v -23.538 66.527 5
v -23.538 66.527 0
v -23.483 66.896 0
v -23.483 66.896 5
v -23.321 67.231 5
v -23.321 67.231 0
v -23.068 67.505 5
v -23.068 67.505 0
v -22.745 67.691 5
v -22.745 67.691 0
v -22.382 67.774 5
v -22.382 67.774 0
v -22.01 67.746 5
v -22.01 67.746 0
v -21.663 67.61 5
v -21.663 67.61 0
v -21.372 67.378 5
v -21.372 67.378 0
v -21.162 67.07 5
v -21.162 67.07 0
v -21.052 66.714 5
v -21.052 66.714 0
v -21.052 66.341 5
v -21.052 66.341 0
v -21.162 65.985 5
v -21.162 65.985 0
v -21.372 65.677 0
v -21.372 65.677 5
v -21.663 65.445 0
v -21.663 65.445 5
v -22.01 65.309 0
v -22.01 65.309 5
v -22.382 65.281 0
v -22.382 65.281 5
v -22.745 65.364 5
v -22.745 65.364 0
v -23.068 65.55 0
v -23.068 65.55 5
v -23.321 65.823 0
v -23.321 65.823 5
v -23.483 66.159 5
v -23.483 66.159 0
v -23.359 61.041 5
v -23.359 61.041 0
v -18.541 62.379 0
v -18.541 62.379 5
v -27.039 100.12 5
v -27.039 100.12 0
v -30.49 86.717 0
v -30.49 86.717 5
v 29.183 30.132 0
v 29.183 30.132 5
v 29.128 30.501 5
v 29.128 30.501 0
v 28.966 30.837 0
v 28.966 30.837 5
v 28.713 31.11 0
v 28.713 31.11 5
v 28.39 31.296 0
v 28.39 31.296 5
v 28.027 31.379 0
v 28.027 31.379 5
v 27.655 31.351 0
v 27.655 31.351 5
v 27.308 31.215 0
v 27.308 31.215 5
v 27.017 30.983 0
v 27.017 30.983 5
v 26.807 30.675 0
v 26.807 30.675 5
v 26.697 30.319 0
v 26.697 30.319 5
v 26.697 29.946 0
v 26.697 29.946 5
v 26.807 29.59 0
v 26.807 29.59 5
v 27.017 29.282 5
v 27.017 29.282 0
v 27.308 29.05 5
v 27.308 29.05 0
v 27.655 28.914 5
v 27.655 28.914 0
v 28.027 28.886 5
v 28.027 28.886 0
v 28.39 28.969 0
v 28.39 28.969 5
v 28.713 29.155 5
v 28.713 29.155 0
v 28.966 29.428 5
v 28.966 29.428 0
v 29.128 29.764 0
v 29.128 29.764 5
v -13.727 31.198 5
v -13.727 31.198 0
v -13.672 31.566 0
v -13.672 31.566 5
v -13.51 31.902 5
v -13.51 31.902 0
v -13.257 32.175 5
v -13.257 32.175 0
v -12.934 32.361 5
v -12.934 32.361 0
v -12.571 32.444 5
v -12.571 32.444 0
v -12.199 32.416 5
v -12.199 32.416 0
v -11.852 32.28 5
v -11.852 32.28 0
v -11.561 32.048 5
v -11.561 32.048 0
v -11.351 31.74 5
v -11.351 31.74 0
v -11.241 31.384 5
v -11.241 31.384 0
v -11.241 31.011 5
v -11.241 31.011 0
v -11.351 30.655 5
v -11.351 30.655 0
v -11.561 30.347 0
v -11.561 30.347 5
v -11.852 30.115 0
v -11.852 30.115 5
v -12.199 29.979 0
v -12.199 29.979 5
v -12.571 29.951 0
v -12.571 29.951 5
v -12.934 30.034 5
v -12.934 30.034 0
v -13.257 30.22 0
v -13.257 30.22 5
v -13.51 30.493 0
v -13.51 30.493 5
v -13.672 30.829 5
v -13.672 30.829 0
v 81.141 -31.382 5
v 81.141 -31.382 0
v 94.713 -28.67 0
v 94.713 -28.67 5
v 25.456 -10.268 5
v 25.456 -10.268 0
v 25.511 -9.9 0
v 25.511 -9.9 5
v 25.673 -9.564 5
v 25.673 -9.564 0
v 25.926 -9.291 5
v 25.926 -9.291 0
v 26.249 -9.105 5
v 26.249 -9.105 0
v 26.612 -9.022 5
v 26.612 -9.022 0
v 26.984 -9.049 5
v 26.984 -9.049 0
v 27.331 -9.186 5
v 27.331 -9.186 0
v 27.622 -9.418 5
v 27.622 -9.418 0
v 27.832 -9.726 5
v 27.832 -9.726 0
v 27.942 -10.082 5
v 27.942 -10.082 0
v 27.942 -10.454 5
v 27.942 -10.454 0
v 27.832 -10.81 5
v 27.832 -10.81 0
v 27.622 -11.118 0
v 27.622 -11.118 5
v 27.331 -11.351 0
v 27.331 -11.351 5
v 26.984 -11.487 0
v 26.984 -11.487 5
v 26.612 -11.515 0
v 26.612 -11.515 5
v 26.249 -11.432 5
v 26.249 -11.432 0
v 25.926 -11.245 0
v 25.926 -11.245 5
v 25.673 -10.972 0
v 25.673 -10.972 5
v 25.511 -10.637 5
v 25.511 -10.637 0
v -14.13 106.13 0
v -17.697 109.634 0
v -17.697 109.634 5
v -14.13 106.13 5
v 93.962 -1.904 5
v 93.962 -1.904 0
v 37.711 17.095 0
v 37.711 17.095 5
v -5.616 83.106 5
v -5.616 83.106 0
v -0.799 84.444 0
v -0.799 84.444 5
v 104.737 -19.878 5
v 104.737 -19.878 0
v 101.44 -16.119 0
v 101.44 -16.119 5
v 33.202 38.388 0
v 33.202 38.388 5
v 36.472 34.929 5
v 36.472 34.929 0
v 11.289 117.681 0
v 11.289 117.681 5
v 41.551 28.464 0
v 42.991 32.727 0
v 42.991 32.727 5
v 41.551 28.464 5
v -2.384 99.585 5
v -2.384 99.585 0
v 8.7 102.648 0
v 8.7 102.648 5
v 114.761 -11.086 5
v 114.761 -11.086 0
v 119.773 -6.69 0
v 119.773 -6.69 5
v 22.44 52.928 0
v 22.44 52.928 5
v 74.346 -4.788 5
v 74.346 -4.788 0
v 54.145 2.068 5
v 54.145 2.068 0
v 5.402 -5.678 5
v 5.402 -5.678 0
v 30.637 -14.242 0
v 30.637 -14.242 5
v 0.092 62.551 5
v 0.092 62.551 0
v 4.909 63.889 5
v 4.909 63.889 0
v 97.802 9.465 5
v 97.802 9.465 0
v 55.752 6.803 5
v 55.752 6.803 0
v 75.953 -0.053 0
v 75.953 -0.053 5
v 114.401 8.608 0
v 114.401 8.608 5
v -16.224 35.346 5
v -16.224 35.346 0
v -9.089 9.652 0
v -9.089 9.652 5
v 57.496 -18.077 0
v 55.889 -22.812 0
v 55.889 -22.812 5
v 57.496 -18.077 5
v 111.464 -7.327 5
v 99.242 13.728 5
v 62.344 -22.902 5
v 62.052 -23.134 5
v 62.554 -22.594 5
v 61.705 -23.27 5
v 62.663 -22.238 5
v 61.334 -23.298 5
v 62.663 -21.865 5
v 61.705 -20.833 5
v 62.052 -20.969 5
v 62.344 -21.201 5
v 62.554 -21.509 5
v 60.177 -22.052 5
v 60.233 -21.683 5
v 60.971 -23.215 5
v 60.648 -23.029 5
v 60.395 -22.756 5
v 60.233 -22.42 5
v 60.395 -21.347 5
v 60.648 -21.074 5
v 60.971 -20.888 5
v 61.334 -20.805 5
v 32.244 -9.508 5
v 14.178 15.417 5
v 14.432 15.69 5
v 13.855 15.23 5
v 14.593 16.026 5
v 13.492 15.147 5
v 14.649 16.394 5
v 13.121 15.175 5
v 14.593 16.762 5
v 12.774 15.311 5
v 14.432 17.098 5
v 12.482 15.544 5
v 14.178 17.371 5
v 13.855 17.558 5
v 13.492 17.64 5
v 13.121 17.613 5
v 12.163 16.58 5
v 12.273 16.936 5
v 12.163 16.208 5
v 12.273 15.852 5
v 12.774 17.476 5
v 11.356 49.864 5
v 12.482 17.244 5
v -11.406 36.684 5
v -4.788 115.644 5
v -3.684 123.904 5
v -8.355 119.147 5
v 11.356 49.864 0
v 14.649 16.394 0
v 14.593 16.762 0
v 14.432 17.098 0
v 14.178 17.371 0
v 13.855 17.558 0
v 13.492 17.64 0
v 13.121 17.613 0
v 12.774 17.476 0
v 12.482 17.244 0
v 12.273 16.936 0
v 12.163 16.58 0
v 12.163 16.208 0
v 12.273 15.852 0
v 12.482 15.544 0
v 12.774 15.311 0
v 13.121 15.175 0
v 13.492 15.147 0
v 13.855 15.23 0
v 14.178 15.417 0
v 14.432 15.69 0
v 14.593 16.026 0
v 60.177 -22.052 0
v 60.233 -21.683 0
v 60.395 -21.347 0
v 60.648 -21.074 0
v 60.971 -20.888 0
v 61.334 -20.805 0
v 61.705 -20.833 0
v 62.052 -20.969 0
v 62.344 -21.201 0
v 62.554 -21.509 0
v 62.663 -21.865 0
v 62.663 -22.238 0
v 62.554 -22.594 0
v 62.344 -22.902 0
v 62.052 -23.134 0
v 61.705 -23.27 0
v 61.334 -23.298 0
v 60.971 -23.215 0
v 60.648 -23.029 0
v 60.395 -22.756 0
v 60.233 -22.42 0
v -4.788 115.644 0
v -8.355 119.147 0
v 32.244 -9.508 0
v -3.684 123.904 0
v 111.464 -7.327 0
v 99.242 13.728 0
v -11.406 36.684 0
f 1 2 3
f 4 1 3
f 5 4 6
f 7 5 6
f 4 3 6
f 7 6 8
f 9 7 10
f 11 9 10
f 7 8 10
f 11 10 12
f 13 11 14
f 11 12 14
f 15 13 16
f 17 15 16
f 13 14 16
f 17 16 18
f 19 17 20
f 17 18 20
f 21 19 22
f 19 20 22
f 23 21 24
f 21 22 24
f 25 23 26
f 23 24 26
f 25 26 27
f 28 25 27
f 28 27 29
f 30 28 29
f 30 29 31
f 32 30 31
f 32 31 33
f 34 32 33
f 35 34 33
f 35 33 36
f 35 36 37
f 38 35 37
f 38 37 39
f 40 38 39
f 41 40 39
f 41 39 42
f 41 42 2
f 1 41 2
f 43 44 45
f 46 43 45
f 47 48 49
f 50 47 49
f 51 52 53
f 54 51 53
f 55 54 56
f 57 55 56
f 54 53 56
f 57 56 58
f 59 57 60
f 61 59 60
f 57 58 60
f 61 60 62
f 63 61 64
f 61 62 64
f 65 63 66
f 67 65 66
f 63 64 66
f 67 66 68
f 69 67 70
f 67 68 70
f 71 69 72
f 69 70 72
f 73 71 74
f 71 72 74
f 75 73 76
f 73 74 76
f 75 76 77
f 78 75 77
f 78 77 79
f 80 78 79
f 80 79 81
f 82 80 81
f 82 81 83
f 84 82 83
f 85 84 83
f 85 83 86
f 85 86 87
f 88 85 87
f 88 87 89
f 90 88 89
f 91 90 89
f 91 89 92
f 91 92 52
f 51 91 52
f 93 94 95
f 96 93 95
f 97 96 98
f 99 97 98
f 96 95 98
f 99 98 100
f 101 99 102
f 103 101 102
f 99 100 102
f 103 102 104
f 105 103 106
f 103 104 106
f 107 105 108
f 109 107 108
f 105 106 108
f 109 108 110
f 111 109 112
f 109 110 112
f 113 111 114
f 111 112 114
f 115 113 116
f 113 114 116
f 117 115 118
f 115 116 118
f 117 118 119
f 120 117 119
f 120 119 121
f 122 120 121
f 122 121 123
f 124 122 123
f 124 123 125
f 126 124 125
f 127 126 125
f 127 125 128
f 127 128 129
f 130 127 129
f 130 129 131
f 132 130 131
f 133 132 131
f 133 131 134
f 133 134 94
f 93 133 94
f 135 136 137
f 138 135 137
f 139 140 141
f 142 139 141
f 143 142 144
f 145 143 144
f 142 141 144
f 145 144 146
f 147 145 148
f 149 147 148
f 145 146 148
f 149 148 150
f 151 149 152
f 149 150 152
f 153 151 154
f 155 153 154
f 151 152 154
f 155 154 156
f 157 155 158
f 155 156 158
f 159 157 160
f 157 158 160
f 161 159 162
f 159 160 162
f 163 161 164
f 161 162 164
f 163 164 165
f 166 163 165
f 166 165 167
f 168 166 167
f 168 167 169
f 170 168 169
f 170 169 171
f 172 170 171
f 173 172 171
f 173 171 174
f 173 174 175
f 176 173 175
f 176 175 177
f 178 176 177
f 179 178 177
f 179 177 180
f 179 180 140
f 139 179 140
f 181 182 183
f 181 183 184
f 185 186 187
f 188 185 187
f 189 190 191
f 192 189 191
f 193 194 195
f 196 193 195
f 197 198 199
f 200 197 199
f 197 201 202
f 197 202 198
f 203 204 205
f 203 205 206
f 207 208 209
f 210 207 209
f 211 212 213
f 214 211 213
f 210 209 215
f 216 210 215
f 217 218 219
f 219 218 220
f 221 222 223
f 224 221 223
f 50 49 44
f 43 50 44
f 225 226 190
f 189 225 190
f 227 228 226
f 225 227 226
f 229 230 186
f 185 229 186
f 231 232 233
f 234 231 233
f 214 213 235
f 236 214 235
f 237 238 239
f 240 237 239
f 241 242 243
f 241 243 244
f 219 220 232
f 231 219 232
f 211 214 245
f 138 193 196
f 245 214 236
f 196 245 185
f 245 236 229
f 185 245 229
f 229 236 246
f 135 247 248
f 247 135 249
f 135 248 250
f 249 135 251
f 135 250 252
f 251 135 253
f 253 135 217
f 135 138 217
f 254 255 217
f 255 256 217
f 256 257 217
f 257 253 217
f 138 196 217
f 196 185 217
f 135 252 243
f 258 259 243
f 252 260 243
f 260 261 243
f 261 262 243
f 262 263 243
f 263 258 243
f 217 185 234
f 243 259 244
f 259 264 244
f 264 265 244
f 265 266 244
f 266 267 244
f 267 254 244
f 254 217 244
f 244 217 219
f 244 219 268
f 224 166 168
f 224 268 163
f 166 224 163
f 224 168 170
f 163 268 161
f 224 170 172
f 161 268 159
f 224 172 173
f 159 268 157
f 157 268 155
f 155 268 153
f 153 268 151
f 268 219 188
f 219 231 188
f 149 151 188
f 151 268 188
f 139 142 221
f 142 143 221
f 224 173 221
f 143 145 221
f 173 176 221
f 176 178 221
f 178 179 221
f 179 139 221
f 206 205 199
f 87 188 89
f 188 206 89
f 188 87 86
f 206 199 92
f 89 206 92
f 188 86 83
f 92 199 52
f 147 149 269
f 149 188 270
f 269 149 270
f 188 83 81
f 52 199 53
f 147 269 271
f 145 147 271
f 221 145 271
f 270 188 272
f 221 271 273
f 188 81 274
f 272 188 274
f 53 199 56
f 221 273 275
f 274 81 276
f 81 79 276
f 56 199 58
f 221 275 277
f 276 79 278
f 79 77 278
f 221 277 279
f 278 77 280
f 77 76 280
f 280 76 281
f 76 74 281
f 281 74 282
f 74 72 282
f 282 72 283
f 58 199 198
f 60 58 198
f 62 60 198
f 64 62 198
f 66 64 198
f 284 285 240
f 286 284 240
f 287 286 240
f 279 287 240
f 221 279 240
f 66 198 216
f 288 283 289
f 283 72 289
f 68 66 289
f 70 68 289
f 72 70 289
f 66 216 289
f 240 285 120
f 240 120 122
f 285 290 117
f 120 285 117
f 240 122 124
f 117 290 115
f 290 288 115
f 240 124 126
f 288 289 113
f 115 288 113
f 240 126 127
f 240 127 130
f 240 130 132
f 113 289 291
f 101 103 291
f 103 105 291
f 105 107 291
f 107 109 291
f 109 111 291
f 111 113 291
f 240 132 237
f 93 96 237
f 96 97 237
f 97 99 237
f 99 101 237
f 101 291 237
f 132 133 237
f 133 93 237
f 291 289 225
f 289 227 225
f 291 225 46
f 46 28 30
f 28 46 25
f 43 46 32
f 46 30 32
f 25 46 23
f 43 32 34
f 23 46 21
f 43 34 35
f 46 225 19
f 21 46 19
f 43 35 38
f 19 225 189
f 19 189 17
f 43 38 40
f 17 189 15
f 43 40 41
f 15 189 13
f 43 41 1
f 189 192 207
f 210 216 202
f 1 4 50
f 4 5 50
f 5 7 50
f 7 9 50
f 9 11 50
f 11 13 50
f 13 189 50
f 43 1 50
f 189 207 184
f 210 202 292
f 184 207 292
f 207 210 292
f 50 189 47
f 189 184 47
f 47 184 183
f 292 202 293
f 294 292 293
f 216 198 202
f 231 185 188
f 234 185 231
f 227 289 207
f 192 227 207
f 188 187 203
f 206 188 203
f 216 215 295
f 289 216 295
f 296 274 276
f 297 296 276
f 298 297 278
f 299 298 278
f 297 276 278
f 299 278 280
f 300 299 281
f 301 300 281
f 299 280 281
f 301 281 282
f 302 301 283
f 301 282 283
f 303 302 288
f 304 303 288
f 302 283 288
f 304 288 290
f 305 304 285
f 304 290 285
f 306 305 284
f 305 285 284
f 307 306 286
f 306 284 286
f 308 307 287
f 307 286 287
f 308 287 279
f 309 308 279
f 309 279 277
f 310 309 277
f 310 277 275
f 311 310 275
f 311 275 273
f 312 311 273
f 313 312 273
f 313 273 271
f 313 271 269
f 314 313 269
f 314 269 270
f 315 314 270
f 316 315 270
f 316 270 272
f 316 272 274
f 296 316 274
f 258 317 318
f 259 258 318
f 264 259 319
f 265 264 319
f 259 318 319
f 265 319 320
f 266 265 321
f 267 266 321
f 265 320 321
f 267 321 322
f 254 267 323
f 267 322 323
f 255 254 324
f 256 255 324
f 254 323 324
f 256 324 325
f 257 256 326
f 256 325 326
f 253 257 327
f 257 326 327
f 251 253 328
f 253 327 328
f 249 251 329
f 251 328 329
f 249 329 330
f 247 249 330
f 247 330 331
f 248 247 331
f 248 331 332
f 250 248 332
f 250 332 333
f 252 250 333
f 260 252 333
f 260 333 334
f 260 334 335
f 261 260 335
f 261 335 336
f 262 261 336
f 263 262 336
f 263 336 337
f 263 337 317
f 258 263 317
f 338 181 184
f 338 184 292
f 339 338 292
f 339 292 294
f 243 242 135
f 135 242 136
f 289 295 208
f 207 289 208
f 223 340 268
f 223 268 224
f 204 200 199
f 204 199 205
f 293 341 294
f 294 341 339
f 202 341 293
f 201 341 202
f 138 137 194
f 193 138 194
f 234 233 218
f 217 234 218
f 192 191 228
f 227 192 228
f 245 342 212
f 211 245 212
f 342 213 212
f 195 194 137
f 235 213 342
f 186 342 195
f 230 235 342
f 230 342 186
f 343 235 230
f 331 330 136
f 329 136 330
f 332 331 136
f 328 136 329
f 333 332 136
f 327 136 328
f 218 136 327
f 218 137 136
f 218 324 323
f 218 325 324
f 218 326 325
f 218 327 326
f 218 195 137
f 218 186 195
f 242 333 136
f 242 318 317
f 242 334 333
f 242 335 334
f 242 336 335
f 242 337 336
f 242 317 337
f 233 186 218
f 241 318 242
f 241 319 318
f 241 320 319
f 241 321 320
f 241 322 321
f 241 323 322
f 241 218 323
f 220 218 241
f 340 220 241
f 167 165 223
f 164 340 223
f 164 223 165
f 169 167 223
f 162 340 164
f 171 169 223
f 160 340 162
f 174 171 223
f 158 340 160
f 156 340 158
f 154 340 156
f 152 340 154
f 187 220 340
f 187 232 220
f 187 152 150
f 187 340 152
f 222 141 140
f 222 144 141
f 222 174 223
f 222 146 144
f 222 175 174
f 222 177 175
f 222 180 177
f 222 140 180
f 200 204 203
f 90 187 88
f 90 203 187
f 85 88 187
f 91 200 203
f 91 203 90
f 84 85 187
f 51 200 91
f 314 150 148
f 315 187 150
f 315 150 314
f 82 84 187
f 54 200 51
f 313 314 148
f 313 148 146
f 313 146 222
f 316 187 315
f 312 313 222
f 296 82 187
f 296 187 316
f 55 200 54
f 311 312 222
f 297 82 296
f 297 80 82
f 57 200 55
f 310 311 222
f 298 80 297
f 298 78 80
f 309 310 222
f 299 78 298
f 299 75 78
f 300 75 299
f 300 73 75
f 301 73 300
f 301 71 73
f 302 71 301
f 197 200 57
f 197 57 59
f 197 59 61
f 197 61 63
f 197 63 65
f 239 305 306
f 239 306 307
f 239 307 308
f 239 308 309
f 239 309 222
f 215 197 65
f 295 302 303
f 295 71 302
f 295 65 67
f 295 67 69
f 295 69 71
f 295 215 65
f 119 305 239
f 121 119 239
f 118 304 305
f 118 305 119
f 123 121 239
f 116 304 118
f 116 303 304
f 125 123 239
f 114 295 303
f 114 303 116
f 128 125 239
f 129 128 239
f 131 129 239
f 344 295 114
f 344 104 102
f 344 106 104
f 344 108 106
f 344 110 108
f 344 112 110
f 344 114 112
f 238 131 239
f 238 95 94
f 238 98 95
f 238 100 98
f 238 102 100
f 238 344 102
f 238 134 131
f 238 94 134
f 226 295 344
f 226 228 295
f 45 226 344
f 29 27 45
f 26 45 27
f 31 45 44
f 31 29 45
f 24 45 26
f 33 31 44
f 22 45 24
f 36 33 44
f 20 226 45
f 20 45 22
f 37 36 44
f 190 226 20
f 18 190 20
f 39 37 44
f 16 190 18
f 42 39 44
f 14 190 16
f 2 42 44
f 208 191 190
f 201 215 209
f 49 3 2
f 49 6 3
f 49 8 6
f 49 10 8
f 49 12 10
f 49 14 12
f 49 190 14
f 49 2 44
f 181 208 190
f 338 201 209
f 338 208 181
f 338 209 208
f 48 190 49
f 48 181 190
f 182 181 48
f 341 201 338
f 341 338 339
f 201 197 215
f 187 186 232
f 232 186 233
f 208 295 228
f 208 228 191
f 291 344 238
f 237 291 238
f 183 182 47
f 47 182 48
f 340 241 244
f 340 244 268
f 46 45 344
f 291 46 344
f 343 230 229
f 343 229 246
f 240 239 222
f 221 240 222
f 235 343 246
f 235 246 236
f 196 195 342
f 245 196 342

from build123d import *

# Parameters (mm, degrees)
SALIENTE_EXTRUIR1_DEPTH = 5
CROQUIS2_R              = 1.25
CORTAR_EXTRUIR1_DEPTH   = 10
CORTAR_EXTRUIR2_DEPTH   = 10
CORTAR_EXTRUIR3_DEPTH   = 10
CORTAR_EXTRUIR4_DEPTH   = 22
CORTAR_EXTRUIR5_DEPTH   = 10
SALIENTE_EXTRUIR3_DEPTH = 5
CORTAR_EXTRUIR7_DEPTH   = 5
CROQUIS9_R              = 1.25
CORTAR_EXTRUIR6_DEPTH   = 10


with BuildPart() as part:
    # Croquis1 → Saliente-Extruir1 (new body)
    with BuildSketch(Plane.XY):
        Polygon((94.71302301, -28.670259317), (124.784571975, -2.294096918), (121.487551675, 1.464846702), (33.971255169, 31.023525729), (29.162783478, 36.110627065), (4.554636507, 125.156882092), (0.987169784, 128.660192123), (-27.039310471, 100.120458339), (-30.489528096, 86.717422014), (-9.088639631, 9.652046375), (5.402210696, -5.678484568), (81.141270829, -31.381887447), align=None)
    extrude(amount=SALIENTE_EXTRUIR1_DEPTH)

    # Croquis2 → Cortar-Extruir1 (cut)
    with BuildSketch(Plane.XY.offset(5)):
        with Locations((27.933375513, 30.132453761)):
            Circle(CROQUIS2_R)
        with Locations((13.398800269, 16.393963215)):
            Circle(CROQUIS2_R)
    extrude(amount=-CORTAR_EXTRUIR1_DEPTH, mode=Mode.SUBTRACT)

    # Croquis3 → Cortar-Extruir2 (cut)
    with BuildSketch(Plane(origin=(0, 0, 0), x_dir=(-1, 0, 0), z_dir=(0, 0, -1))):
        Polygon((-93.962142428, -1.904403336), (-37.71071672, 17.094547759), (-41.550617787, 28.463591685), (-97.802043495, 9.46464059), align=None)
    extrude(amount=-CORTAR_EXTRUIR2_DEPTH, mode=Mode.SUBTRACT)

    # Croquis4 → Cortar-Extruir3 (cut)
    with BuildSketch(Plane(origin=(0, 0, 0), x_dir=(-1, 0, 0), z_dir=(0, 0, -1))):
        Polygon((-11.35589305, 49.864341228), (2.384432549, 99.58464479), (-8.700088084, 102.647878755), (-22.440413684, 52.927575193), align=None)
    extrude(amount=-CORTAR_EXTRUIR3_DEPTH, mode=Mode.SUBTRACT)

    # Croquis5 → Cortar-Extruir4 (cut)
    with BuildSketch(Plane(origin=(0, 0, 0), x_dir=(-1, 0, 0), z_dir=(0, 0, -1))):
        Polygon((23.359165427, 61.040727405), (18.541476581, 62.378589198), (11.406213682, 36.684248684), (16.223902529, 35.34638689), align=None)
        Polygon((-55.889136713, -22.812124691), (-57.49596723, -18.077349544), (-32.243833114, -9.507586787), (-30.637002597, -14.242361934), align=None)
        Polygon((-101.439852365, -16.119261564), (-111.46370202, -7.327207431), (-114.76072232, -11.086151051), (-104.736872665, -19.878205184), align=None)
        Polygon((14.129683663, 106.130392902), (4.787523578, 115.643637497), (8.354990301, 119.146947529), (17.697150386, 109.633702934), align=None)
    extrude(amount=-CORTAR_EXTRUIR4_DEPTH, mode=Mode.SUBTRACT)

    # Croquis6 → Cortar-Extruir5 (cut)
    with BuildSketch(Plane(origin=(0, 0, 0), x_dir=(-1, 0, 0), z_dir=(0, 0, -1))):
        Polygon((-55.751519014, 6.80303632), (-75.953226307, -0.052773886), (-74.34639579, -4.787549032), (-54.144688498, 2.068261173), align=None)
        Polygon((0.798726555, 84.444359548), (-4.909483764, 63.888887136), (-0.091794917, 62.551025343), (5.616415401, 83.106497755), align=None)
    extrude(amount=-CORTAR_EXTRUIR5_DEPTH, mode=Mode.SUBTRACT)

    # Croquis10 → Saliente-Extruir3 (add)
    with BuildSketch(Plane(origin=(0, 0, 0), x_dir=(-1, 0, 0), z_dir=(0, 0, -1))):
        Polygon((-121.487551675, 1.464846702), (-97.802043495, 9.46464059), (-99.242006394, 13.728032063), (-122.927514575, 5.728238174), align=None)
        Polygon((-29.162783478, 36.110627065), (-4.554636507, 125.156882092), (-8.892057625, 126.355538861), (-33.202024845, 38.388267562), (-36.472242051, 34.928555747), (-42.990580687, 32.726983158), (-41.550617787, 28.463591685), (-33.971255169, 31.023525729), align=None)
    extrude(amount=-SALIENTE_EXTRUIR3_DEPTH)

    # Croquis11 → Cortar-Extruir7 (cut)
    with BuildSketch(Plane(origin=(0, 0, 0), x_dir=(-1, 0, 0), z_dir=(0, 0, -1))):
        Polygon((-119.772647147, -6.690123985), (-114.40073163, 8.608163974), (-122.927514575, 5.728238174), (-121.487551675, 1.464846702), (-124.784571975, -2.294096918), align=None)
        Polygon((3.683910258, 123.903569826), (-11.289371163, 117.680696626), (-8.892057625, 126.355538861), (-4.554636507, 125.156882092), (-0.987169784, 128.660192123), align=None)
    extrude(amount=-CORTAR_EXTRUIR7_DEPTH, mode=Mode.SUBTRACT)

    # Croquis9 → Cortar-Extruir6 (cut)
    with BuildSketch(Plane(origin=(0, 0, 0), x_dir=(-1, 0, 0), z_dir=(0, 0, -1))):
        with Locations((-26.705642709, -10.268143844)):
            Circle(CROQUIS9_R)
        with Locations((-61.427327118, -22.051567634)):
            Circle(CROQUIS9_R)
        with Locations((12.477196312, 31.19762894)):
            Circle(CROQUIS9_R)
        with Locations((22.288182797, 66.527347148)):
            Circle(CROQUIS9_R)
    extrude(amount=-CORTAR_EXTRUIR6_DEPTH, mode=Mode.SUBTRACT)


solid = part.part
